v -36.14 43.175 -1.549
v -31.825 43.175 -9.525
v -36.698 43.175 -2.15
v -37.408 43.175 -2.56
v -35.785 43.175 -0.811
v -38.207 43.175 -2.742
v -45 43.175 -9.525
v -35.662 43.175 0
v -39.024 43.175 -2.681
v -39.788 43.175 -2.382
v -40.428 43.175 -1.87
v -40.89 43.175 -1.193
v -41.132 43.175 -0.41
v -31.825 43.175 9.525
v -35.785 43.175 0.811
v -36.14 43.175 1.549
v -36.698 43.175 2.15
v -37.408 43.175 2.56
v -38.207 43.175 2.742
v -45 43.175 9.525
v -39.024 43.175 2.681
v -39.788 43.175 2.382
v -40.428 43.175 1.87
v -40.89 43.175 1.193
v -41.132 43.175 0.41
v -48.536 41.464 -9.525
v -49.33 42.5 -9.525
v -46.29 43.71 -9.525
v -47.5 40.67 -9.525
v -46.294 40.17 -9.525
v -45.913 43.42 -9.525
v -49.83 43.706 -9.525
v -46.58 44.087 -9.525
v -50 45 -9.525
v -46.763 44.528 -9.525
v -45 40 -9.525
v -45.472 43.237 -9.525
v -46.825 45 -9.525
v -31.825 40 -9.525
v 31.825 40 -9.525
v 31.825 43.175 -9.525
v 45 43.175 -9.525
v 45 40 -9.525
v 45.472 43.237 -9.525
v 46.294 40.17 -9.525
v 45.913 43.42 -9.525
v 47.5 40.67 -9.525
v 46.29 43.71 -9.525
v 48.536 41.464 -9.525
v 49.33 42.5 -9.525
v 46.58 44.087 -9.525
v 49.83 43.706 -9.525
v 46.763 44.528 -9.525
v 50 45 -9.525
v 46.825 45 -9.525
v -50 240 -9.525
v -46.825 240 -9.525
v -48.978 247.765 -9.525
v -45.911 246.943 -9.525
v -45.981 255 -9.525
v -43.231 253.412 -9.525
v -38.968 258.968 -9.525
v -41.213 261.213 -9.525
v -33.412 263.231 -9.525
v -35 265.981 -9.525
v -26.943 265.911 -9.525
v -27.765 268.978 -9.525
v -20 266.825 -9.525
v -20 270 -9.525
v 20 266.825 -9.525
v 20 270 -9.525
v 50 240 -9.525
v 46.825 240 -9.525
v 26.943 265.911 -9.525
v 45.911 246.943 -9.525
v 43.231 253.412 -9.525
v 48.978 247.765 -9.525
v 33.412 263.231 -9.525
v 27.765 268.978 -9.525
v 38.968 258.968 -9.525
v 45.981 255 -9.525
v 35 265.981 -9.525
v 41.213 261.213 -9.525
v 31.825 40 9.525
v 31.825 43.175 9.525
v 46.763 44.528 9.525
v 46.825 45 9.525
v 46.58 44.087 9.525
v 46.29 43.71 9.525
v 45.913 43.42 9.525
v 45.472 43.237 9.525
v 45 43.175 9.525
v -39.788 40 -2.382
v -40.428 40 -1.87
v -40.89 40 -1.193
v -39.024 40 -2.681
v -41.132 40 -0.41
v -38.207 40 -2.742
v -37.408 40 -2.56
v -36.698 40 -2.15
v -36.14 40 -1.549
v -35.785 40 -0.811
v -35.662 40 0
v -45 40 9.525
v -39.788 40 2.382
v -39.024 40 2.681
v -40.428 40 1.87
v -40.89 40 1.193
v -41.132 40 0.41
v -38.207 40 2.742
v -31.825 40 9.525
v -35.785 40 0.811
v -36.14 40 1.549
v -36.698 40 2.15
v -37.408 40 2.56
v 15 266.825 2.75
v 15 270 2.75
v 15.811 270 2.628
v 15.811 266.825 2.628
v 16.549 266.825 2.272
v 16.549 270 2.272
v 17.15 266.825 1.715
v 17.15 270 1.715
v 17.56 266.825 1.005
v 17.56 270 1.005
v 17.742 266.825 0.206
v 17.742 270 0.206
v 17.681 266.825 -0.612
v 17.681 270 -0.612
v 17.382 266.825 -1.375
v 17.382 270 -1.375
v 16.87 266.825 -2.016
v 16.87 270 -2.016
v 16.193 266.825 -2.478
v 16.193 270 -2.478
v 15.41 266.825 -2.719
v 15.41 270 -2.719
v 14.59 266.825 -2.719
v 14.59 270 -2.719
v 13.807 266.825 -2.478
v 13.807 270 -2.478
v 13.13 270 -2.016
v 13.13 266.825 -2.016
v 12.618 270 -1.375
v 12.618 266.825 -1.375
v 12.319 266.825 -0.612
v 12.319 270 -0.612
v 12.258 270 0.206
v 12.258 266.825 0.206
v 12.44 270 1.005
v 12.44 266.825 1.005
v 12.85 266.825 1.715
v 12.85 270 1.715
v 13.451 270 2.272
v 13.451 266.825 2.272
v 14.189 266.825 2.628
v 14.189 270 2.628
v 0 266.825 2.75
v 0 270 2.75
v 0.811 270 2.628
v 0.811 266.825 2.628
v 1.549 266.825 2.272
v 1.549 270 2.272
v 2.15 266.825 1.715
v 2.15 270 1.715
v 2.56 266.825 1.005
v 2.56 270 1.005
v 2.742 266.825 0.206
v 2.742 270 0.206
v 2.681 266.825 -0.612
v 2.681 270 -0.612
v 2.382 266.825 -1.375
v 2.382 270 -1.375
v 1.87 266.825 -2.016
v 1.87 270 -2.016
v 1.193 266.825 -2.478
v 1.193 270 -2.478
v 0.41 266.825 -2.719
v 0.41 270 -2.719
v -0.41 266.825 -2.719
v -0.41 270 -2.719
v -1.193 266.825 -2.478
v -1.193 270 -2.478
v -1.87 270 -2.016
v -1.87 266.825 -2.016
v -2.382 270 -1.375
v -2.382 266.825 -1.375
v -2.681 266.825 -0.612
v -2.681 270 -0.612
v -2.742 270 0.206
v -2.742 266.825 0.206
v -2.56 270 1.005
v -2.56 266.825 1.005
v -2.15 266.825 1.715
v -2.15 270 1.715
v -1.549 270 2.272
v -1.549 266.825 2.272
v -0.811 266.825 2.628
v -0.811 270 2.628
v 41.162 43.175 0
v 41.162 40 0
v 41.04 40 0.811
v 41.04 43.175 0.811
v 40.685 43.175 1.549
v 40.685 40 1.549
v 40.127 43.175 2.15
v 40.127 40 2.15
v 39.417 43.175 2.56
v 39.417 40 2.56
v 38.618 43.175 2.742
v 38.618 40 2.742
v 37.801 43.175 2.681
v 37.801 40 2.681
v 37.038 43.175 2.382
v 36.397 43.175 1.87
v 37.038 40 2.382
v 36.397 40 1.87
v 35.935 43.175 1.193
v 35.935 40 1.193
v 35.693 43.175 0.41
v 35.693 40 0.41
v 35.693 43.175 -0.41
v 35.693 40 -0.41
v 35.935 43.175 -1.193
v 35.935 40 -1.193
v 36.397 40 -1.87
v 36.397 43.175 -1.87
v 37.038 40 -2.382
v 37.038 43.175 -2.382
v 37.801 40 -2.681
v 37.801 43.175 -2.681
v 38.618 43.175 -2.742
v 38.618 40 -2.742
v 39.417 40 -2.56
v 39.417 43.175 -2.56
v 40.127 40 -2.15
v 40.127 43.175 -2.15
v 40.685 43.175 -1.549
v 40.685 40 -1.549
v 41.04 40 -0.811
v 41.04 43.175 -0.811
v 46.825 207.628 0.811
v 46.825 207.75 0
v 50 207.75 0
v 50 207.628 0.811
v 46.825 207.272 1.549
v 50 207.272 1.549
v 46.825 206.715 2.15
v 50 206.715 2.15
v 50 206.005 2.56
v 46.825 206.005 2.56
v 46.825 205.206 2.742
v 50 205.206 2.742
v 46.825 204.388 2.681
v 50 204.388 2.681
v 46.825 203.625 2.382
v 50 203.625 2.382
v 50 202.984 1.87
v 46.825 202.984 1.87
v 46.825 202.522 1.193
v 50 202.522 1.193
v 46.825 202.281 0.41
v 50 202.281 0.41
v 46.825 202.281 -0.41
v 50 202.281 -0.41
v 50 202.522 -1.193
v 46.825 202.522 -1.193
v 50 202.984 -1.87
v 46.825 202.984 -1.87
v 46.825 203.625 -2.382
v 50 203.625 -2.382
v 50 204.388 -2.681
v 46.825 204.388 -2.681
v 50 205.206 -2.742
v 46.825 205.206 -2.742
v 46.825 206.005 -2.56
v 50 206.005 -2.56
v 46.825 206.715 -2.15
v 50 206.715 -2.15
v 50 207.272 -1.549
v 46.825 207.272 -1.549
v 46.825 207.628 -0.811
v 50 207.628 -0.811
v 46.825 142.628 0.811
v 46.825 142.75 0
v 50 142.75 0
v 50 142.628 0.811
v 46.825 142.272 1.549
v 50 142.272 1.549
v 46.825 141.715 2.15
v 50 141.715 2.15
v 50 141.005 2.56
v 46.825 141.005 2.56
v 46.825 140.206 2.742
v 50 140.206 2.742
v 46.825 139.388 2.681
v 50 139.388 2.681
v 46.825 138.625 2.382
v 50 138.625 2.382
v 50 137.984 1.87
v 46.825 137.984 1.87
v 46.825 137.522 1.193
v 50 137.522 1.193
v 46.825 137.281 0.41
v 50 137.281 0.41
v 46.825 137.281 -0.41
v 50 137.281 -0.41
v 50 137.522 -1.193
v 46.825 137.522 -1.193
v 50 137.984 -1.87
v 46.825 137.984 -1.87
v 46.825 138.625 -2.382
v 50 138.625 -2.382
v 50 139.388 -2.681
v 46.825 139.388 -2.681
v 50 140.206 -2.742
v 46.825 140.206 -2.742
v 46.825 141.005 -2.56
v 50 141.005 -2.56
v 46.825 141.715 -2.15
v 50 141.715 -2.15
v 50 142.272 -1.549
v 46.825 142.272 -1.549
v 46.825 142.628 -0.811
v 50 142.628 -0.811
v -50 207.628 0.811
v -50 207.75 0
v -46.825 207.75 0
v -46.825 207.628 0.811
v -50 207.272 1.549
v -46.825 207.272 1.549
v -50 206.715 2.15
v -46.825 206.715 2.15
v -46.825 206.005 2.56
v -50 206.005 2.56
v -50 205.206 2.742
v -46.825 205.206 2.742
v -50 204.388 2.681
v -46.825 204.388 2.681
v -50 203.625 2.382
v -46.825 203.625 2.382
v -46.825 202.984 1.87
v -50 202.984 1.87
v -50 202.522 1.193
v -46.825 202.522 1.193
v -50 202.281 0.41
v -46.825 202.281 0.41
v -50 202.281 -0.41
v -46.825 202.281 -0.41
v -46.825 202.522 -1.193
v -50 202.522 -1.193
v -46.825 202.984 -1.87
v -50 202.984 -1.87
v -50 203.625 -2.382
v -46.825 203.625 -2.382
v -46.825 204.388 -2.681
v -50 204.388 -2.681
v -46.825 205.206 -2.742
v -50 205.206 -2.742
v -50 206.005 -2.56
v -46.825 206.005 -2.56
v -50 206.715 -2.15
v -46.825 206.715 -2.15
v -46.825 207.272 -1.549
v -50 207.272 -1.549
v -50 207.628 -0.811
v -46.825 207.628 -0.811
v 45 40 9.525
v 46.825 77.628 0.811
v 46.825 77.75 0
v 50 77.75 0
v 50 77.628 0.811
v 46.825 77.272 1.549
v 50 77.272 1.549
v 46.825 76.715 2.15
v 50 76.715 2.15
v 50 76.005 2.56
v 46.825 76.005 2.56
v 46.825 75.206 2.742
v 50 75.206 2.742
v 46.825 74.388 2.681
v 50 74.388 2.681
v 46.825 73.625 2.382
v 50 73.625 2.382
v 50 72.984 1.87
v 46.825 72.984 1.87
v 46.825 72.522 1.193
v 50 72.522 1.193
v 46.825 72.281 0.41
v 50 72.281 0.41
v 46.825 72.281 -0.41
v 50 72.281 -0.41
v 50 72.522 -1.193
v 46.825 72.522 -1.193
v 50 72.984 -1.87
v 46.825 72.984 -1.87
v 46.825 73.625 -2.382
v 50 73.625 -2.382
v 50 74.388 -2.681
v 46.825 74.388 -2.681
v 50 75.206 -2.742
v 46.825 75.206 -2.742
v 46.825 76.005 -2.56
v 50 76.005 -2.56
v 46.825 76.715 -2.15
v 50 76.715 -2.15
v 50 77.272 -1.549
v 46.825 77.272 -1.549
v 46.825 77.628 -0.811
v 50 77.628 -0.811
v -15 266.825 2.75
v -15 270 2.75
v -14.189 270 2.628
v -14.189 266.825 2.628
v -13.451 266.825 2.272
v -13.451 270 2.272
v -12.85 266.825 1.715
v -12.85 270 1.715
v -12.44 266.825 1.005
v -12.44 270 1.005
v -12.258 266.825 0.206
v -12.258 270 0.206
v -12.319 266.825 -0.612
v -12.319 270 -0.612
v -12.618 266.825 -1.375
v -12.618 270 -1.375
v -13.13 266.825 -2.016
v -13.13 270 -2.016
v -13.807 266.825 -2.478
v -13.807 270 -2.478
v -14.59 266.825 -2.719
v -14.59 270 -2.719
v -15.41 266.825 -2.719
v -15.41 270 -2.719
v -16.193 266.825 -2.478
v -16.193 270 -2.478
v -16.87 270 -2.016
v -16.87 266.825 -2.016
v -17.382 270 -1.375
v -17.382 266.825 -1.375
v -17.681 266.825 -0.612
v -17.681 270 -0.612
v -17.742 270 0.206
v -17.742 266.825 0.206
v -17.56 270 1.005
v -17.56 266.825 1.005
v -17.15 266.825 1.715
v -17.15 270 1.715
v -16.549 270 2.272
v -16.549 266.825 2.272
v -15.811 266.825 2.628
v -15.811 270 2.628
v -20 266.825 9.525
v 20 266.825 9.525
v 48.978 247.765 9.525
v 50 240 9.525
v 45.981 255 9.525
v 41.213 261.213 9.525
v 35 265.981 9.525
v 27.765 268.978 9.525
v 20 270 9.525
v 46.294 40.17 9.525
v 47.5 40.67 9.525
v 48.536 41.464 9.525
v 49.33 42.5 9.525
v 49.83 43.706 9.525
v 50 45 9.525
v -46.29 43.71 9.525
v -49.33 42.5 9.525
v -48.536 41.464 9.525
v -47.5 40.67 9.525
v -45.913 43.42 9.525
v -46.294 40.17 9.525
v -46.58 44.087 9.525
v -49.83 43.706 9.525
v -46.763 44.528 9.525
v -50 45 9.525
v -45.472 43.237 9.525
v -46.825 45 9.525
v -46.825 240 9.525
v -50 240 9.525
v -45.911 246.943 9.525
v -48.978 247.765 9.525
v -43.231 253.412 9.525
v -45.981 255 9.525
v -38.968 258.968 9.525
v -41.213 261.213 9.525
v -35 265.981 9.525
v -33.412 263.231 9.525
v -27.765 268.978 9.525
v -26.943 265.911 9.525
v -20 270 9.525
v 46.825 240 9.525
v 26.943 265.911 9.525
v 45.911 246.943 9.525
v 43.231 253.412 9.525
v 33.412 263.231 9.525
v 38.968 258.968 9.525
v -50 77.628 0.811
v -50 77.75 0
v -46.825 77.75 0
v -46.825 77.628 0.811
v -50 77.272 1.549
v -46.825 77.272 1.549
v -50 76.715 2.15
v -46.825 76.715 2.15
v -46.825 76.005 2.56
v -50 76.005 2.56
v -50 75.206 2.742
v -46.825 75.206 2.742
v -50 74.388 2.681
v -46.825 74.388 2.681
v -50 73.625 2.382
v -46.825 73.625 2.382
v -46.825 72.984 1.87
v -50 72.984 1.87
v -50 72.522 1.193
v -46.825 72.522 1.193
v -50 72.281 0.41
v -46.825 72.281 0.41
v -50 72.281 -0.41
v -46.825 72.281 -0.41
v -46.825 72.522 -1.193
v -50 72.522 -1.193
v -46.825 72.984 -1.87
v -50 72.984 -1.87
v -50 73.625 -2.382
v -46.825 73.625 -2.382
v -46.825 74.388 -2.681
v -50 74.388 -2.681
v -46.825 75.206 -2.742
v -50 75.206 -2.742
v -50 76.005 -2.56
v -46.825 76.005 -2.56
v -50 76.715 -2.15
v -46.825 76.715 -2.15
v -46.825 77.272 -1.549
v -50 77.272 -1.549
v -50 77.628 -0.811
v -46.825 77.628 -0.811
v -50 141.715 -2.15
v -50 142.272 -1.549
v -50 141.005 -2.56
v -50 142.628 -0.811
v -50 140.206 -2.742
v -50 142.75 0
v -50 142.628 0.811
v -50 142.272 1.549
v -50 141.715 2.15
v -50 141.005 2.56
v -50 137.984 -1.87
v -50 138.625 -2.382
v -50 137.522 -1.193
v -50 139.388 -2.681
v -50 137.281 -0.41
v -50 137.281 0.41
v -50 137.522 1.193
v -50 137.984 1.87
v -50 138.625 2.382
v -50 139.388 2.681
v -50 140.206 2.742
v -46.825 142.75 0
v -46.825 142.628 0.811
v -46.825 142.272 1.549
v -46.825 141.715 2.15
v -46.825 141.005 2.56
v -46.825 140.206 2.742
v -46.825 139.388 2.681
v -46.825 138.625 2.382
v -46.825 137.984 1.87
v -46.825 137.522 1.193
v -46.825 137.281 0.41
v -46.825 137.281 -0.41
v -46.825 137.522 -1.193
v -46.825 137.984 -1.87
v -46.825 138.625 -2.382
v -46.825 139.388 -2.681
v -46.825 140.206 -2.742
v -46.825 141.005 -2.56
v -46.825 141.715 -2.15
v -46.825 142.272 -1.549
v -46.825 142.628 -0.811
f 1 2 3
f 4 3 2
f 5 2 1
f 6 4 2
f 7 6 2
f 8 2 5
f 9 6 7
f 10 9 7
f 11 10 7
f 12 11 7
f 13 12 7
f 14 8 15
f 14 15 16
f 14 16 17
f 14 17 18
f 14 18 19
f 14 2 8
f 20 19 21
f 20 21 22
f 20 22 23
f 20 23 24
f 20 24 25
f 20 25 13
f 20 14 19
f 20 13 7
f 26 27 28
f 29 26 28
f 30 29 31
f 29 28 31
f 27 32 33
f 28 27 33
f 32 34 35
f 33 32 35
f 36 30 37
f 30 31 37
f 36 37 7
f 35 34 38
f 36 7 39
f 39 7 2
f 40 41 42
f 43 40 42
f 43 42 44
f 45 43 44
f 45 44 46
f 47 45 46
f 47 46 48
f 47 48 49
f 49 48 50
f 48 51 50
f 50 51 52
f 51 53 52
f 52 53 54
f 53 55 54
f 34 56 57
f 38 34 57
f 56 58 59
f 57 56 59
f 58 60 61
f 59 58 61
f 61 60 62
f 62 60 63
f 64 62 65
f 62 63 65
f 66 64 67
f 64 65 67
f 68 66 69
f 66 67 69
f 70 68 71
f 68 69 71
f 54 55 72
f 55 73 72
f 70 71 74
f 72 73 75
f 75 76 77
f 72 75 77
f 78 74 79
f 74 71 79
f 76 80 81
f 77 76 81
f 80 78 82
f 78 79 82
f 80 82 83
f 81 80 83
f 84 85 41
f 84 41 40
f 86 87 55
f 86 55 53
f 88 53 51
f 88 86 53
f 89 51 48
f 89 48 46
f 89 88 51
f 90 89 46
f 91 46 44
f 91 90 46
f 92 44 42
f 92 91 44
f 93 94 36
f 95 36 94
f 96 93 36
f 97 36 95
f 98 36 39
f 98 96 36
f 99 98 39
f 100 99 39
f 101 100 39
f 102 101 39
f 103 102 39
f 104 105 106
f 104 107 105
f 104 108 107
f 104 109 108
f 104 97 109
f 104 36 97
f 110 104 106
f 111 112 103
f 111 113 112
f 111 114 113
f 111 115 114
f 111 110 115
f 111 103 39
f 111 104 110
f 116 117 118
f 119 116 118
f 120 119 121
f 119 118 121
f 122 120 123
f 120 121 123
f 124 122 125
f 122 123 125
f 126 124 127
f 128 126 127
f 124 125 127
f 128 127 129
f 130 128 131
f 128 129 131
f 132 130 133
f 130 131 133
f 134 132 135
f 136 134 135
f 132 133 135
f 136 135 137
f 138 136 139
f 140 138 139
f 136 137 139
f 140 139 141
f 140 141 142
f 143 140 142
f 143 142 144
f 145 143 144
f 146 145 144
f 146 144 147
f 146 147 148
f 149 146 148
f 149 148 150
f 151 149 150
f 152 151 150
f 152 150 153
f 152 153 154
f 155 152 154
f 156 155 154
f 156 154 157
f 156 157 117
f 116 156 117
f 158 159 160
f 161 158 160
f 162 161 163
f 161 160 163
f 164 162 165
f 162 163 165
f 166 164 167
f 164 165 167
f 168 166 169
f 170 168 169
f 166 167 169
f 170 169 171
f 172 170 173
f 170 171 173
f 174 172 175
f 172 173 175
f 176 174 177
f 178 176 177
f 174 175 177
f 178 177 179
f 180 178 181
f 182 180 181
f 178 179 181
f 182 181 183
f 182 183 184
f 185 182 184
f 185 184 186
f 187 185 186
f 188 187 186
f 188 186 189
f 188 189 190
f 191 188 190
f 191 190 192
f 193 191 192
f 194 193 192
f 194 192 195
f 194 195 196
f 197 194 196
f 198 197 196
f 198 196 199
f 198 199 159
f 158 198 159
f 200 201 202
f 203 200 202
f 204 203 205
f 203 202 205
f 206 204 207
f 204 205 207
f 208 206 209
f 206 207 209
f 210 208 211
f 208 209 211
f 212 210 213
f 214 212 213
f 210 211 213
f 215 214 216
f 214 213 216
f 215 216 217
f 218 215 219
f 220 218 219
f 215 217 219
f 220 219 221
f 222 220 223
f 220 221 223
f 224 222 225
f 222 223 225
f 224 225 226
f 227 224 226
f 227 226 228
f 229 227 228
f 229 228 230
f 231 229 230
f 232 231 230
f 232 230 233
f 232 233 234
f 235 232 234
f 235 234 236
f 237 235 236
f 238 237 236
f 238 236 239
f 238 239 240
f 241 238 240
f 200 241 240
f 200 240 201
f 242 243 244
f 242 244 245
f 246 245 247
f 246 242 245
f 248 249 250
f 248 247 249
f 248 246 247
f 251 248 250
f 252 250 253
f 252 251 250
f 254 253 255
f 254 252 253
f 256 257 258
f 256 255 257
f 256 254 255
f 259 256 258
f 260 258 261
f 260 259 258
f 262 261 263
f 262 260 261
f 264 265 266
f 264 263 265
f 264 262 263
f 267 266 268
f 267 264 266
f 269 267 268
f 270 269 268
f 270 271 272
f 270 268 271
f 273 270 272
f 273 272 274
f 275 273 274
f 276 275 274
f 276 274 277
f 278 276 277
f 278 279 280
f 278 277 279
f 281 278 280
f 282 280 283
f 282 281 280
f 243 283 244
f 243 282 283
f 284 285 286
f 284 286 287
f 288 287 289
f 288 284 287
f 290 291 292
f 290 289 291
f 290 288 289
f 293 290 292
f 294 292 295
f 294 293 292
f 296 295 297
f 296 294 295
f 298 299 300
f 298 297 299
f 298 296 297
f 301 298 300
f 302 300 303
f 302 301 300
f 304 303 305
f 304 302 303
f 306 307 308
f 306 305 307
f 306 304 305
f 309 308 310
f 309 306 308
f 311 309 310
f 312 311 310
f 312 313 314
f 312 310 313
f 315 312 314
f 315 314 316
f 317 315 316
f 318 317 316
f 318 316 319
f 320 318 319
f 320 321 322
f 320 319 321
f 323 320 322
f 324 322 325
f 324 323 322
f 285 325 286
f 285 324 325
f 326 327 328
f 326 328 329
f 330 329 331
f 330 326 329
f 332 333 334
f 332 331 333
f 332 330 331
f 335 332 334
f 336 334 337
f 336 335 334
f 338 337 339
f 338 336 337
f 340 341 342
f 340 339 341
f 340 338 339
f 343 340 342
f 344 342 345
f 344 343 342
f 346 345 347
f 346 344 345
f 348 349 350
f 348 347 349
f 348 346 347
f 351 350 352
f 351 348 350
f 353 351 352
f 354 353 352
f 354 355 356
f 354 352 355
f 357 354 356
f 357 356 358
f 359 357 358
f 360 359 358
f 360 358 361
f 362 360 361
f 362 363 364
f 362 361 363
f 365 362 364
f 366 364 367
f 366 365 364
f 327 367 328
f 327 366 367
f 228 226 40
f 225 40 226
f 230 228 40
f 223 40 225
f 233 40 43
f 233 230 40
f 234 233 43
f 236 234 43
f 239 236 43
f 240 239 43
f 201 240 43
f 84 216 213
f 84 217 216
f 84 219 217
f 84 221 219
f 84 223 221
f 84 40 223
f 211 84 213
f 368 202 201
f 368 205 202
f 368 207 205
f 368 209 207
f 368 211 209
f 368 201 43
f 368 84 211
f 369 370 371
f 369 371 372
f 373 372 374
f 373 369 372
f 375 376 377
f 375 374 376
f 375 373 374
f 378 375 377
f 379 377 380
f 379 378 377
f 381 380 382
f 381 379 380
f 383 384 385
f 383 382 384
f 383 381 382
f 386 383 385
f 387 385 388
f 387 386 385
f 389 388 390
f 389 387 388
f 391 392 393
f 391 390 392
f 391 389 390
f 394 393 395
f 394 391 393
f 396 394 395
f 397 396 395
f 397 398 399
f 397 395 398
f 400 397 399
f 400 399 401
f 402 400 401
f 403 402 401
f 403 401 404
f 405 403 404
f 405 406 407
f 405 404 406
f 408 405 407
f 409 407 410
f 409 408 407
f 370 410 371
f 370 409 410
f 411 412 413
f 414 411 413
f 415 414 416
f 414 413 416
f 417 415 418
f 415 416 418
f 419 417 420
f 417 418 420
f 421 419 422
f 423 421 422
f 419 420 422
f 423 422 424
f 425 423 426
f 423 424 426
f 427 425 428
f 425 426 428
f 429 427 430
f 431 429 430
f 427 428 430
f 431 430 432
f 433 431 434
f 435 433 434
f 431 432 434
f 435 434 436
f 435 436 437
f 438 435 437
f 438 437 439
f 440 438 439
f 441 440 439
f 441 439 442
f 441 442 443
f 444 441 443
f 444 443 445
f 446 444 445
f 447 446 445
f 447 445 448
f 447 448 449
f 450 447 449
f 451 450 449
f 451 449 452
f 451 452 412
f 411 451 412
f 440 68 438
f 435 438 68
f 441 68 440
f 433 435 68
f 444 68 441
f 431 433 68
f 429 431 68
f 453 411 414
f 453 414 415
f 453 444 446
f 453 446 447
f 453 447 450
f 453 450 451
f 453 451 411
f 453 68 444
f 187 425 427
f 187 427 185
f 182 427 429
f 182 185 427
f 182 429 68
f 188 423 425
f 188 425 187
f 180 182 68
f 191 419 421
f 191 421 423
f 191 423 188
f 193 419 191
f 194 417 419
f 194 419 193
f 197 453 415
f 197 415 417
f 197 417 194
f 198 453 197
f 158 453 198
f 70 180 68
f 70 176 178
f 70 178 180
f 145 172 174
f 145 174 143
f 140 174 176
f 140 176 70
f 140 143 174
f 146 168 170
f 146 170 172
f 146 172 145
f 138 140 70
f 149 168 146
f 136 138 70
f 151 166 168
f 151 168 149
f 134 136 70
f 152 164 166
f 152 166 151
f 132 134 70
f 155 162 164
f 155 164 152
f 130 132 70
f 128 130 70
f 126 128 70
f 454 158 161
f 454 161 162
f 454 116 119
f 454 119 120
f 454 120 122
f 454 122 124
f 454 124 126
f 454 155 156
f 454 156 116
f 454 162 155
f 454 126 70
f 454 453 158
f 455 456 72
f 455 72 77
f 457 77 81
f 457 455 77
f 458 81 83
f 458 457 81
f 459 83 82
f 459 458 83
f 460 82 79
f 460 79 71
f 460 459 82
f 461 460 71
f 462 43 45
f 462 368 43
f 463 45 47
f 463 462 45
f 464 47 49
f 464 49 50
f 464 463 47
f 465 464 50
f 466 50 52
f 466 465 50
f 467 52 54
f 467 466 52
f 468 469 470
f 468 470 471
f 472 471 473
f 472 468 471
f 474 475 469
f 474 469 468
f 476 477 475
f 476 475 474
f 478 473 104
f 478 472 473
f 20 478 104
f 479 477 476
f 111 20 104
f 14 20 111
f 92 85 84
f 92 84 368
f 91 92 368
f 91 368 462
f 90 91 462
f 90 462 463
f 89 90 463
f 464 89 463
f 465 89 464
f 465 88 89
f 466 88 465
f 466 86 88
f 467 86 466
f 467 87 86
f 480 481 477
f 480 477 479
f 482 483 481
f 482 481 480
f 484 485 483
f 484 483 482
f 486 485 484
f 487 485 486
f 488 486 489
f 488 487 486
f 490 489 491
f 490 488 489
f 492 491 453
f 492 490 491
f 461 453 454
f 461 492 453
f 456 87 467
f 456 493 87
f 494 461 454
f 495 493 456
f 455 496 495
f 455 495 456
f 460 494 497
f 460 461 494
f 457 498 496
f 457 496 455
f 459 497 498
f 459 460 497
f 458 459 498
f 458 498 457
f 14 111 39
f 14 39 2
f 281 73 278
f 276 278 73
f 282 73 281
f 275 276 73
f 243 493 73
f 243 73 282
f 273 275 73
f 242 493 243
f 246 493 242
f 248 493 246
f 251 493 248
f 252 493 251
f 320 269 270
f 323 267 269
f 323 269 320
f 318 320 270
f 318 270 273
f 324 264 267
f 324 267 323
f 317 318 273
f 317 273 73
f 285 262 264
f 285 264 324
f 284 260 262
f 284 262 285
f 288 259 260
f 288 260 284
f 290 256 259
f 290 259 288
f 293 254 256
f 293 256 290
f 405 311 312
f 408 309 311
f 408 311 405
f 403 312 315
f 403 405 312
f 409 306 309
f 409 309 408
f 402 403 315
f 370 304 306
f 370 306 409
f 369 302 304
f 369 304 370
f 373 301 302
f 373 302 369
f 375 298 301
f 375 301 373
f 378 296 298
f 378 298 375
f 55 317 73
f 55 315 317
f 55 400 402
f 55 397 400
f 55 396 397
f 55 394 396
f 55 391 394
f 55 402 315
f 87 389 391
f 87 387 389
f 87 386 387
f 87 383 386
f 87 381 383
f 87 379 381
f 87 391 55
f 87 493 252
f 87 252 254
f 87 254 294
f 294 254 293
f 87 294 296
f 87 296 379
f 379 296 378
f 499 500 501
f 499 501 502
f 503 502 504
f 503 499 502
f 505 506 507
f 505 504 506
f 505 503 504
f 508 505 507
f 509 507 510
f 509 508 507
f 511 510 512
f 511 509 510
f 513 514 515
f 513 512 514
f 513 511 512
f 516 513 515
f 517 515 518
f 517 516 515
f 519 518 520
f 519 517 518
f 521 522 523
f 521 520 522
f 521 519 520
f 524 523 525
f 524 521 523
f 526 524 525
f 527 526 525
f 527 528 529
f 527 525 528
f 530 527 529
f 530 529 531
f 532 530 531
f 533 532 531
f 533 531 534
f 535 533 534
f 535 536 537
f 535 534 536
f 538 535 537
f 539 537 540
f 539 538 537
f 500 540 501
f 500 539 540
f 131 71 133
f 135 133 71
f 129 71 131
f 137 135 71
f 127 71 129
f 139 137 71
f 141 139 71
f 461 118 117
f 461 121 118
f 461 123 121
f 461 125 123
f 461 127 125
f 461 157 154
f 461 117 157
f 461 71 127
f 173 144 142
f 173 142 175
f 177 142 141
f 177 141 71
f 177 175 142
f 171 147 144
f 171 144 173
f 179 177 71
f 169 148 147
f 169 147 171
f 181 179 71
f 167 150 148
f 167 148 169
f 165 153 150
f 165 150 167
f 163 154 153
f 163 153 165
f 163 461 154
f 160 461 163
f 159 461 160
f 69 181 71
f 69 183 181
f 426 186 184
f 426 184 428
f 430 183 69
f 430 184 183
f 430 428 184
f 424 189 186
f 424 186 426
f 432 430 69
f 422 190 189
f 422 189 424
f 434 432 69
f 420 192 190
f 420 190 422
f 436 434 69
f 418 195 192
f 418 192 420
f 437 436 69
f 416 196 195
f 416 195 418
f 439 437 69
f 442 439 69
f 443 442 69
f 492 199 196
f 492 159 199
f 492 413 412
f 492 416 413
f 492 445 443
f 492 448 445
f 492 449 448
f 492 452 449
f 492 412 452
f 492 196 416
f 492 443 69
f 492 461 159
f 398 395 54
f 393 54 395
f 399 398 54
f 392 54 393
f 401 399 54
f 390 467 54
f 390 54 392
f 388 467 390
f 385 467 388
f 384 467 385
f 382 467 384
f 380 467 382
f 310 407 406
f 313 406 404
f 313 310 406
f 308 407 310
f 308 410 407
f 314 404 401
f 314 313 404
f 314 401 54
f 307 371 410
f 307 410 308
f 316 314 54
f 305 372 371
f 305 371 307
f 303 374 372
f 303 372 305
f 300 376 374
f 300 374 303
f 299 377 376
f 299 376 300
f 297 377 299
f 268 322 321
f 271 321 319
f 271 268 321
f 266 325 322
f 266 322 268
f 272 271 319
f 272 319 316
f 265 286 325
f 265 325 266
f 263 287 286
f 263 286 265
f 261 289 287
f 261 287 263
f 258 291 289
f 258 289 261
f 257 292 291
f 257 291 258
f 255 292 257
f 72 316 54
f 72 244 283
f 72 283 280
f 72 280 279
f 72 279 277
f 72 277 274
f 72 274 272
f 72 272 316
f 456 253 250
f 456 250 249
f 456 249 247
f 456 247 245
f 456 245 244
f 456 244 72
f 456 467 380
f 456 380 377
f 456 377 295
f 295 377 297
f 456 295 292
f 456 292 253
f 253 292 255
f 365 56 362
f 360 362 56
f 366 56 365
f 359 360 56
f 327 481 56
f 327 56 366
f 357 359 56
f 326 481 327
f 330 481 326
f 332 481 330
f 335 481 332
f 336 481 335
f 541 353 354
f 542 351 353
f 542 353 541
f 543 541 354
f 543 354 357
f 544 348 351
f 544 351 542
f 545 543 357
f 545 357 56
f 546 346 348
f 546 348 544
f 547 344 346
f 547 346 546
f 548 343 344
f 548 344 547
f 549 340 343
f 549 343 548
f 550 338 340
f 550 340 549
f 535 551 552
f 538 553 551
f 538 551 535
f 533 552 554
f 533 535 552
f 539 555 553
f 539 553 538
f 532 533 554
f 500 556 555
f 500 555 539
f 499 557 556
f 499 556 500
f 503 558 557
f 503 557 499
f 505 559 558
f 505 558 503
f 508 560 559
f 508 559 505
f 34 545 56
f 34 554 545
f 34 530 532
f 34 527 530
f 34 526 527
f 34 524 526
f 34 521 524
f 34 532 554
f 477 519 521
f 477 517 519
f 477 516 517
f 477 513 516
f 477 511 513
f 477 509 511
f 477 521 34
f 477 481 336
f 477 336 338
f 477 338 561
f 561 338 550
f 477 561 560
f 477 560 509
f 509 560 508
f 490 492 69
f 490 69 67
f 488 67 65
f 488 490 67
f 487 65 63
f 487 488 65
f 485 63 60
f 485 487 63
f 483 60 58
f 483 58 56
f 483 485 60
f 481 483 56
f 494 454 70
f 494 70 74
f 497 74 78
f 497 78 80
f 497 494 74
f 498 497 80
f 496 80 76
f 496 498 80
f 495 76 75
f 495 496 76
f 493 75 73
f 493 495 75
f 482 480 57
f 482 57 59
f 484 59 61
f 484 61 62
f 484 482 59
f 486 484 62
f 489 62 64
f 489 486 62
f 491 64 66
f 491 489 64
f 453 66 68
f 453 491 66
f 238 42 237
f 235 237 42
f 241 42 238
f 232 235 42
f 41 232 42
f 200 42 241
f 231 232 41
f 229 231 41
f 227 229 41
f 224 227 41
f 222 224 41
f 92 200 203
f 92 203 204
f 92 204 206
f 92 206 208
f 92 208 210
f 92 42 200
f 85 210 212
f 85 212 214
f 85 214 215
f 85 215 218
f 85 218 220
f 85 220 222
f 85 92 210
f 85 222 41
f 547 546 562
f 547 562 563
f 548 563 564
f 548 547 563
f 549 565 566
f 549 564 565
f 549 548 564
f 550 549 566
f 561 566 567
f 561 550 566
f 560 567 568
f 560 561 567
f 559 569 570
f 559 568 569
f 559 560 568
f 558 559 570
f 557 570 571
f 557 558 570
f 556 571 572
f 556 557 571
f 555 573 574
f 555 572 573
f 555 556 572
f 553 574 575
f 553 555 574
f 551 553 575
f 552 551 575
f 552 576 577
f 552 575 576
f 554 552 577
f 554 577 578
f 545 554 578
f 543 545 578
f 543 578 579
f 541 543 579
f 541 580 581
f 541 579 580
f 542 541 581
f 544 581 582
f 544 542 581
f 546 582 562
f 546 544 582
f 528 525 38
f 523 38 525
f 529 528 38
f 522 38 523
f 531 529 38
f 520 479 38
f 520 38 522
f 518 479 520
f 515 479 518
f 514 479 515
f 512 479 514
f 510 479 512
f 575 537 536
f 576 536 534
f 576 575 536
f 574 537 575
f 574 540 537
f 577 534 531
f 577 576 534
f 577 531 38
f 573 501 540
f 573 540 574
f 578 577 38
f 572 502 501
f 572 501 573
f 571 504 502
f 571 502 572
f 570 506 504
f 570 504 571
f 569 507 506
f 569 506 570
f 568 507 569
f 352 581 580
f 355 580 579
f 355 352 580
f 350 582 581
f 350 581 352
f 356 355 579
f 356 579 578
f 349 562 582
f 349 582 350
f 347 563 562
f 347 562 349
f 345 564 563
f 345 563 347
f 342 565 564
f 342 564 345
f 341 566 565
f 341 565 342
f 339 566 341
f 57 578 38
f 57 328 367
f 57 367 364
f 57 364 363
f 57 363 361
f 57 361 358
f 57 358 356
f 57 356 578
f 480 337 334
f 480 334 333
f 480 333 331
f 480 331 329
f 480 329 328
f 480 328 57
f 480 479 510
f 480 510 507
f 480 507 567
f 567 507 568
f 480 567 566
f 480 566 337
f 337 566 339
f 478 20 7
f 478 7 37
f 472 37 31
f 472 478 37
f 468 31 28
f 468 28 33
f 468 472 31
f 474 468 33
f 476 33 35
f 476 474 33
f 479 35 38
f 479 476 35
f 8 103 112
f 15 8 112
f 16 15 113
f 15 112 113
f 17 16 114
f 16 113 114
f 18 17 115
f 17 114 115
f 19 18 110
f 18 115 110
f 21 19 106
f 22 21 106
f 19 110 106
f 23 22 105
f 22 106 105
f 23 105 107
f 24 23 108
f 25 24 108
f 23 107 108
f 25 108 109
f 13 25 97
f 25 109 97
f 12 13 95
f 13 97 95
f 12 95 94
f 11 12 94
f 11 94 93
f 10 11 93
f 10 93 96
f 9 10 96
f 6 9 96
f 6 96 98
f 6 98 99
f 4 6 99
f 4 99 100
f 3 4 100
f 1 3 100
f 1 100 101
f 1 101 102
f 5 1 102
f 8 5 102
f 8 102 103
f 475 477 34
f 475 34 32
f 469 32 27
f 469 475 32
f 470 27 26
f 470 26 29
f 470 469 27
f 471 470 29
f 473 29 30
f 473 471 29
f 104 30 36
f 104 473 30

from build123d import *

# Parameters (mm, degrees)
BOSS_EXTRUDE1_DEPTH     = 9.525
SKETCH12_R              = 2.75
CUT_EXTRUDE2_DEPTH      = 236.564695201
CUT_EXTRUDE3_DEPTH      = 289.081109455
CUT_EXTRUDE3_DEPTH_BACK = 289.081109455
SKETCH13_R              = 2.75
CUT_EXTRUDE6_REACH      = 237.565
SKETCH16_R              = 2.75


with BuildPart() as part:
    # Sketch1 → Boss-Extrude1 (new, symmetric)
    with BuildSketch(Plane.XY):
        with BuildLine():
            Line((50, 45), (50, 240))
            ThreePointArc((50, 240), (41.213203436, 261.213203436), (20, 270))
            Line((20, 270), (-20, 270))
            ThreePointArc((-20, 270), (-41.213203436, 261.213203436), (-50, 240))
            Line((-50, 240), (-50, 45))
            ThreePointArc((-50, 45), (-48.535533906, 41.464466094), (-45, 40))
            Line((-45, 40), (-31.825, 40))
            Line((-31.825, 40), (-31.825, 43.175))
            Line((-31.825, 43.175), (-45, 43.175))
            ThreePointArc((-45, 43.175), (-46.290469876, 43.709530124), (-46.825, 45))
            Line((-46.825, 45), (-46.825, 240))
            ThreePointArc((-46.825, 240), (-38.968139405, 258.968139405), (-20, 266.825))
            Line((-20, 266.825), (20, 266.825))
            ThreePointArc((20, 266.825), (38.968139405, 258.968139405), (46.825, 240))
            Line((46.825, 240), (46.825, 45))
            ThreePointArc((46.825, 45), (46.290469876, 43.709530124), (45, 43.175))
            Line((45, 43.175), (31.825, 43.175))
            Line((31.825, 43.175), (31.825, 40))
            Line((31.825, 40), (45, 40))
            ThreePointArc((45, 40), (48.535533906, 41.464466094), (50, 45))
        make_face()
    extrude(amount=BOSS_EXTRUDE1_DEPTH, both=True)

    # Sketch12 → Cut-Extrude2 (cut, through all)
    with BuildSketch(Plane(origin=(0, 270, 0), x_dir=(1, 0, 0), z_dir=(0, 1, 0))):
        with Locations(Location((0, 0, 0), (0, 0, 270))):
            Circle(SKETCH12_R)
        with Locations(Location((-15, 0, 0), (0, 0, 270))):
            Circle(SKETCH12_R)
        with Locations(Location((15, 0, 0), (0, 0, 270))):
            Circle(SKETCH12_R)
    extrude(amount=-CUT_EXTRUDE2_DEPTH, mode=Mode.SUBTRACT)

    # Sketch13 → Cut-Extrude3 (cut, two sides: drawn at the far end of the back side and taken through both)
    with BuildSketch(Plane(origin=(50, 0, 0), x_dir=(0, 0, -1), z_dir=(1, 0, 0)).offset(-CUT_EXTRUDE3_DEPTH_BACK)):
        with Locations(Location((0, 205, 0), (0, 0, 90))):
            Circle(SKETCH13_R)
        with Locations(Location((0, 140, 0), (0, 0, 90))):
            Circle(SKETCH13_R)
        with Locations(Location((0, 75, 0), (0, 0, 90))):
            Circle(SKETCH13_R)
    extrude(amount=CUT_EXTRUDE3_DEPTH + CUT_EXTRUDE3_DEPTH_BACK, mode=Mode.SUBTRACT)

    # Sketch16 → Cut-Extrude6 (cut, up to next)
    with BuildSketch(Plane(origin=(0, 40, 0), x_dir=(-1, 0, 0), z_dir=(0, -1, 0)), mode=Mode.PRIVATE) as cut_extrude6_sk1:
        with Locations(Location((38.4125, 0, 0), (0, 0, 180))):
            Circle(SKETCH16_R)
    cut_extrude6_tool1 = extrude(cut_extrude6_sk1.sketch, amount=-CUT_EXTRUDE6_REACH, mode=Mode.PRIVATE) & part.part
    # Sketch16 → Cut-Extrude6 (cut, up to next)
    with BuildSketch(Plane(origin=(0, 40, 0), x_dir=(-1, 0, 0), z_dir=(0, -1, 0)), mode=Mode.PRIVATE) as cut_extrude6_sk2:
        with Locations(Location((-38.4125, 0, 0), (0, 0, 180))):
            Circle(SKETCH16_R)
    cut_extrude6_tool2 = extrude(cut_extrude6_sk2.sketch, amount=-CUT_EXTRUDE6_REACH, mode=Mode.PRIVATE) & part.part
    add(cut_extrude6_tool1.solids().sort_by_distance((-38.4125, 40, 0))[0], mode=Mode.SUBTRACT)
    add(cut_extrude6_tool2.solids().sort_by_distance((38.4125, 40, 0))[0], mode=Mode.SUBTRACT)


solid = part.part
